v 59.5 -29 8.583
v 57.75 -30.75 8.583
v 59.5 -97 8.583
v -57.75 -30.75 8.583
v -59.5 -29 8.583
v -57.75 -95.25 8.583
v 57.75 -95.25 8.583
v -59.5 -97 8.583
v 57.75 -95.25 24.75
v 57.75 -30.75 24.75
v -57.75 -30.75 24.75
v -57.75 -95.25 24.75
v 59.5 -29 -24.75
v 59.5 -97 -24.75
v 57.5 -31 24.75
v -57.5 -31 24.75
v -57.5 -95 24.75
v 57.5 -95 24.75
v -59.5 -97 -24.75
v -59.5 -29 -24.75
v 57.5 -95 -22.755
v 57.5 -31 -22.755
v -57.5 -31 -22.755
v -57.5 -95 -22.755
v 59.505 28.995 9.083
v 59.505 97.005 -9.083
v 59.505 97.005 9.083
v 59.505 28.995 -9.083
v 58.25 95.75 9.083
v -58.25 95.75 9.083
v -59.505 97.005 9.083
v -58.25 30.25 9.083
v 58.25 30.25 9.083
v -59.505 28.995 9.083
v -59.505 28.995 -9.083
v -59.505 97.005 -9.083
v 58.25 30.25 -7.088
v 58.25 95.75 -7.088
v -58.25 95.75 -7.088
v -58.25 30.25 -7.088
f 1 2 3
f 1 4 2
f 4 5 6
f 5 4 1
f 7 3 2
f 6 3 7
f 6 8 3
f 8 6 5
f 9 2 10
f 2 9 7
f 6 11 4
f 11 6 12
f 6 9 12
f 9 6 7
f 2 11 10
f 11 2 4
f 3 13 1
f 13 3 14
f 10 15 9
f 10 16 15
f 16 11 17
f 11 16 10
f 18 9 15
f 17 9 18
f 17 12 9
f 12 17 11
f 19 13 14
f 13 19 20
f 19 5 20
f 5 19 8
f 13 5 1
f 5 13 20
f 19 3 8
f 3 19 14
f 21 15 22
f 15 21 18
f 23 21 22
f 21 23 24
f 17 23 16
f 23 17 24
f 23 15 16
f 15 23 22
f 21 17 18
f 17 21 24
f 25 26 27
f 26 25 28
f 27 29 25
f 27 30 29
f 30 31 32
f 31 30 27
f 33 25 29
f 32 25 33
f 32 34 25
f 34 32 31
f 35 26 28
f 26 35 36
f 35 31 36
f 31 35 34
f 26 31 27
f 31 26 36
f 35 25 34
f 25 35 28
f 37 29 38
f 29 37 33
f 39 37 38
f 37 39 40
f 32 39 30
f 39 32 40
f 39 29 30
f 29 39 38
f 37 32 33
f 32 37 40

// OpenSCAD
longueur_carte = 114;
largeur_carte = 63;
epaisseur_carte = 0.5;
nb_cartes = 94;
hauteur_cartes = epaisseur_carte*nb_cartes;
epaisseur = 2;
marge = 0.5;
manifold = 0.01;


module boite(){
	difference(){
		cube([longueur_carte+2*epaisseur+2*marge, largeur_carte+2*epaisseur+2*marge, hauteur_cartes+epaisseur+marge], center=true);
		translate([0,0,epaisseur/2]) cube([longueur_carte+2*marge, largeur_carte+2*marge, hauteur_cartes+manifold+marge], center=true);
		translate([0,0,hauteur_cartes/2-hauteur_cartes/6+epaisseur]) rotate([180,0,0]) color("red") couvercle_negatif();
	}
}


module couvercle(){
	difference(){
		cube([longueur_carte+2*epaisseur+manifold+2*marge, largeur_carte+2*epaisseur+manifold+2*marge, hauteur_cartes/3+epaisseur+marge], center=true);
		translate([0,0,epaisseur/2]) cube([longueur_carte+epaisseur+marge, largeur_carte+epaisseur+marge, hauteur_cartes/3+manifold+marge], center=true);
	}
}

module couvercle_negatif(){
	difference(){
		cube([longueur_carte+2*epaisseur+manifold+2*marge, largeur_carte+2*epaisseur+manifold+2*marge, hauteur_cartes/3+epaisseur+marge], center=true);
		translate([0,0,epaisseur/2]) cube([longueur_carte+epaisseur-marge, largeur_carte+epaisseur-marge, hauteur_cartes/3+manifold+marge], center=true);
	}
}

translate([0,-largeur_carte,0]) color("blue") boite();
translate([0,+largeur_carte,0]) color("red") couvercle();
